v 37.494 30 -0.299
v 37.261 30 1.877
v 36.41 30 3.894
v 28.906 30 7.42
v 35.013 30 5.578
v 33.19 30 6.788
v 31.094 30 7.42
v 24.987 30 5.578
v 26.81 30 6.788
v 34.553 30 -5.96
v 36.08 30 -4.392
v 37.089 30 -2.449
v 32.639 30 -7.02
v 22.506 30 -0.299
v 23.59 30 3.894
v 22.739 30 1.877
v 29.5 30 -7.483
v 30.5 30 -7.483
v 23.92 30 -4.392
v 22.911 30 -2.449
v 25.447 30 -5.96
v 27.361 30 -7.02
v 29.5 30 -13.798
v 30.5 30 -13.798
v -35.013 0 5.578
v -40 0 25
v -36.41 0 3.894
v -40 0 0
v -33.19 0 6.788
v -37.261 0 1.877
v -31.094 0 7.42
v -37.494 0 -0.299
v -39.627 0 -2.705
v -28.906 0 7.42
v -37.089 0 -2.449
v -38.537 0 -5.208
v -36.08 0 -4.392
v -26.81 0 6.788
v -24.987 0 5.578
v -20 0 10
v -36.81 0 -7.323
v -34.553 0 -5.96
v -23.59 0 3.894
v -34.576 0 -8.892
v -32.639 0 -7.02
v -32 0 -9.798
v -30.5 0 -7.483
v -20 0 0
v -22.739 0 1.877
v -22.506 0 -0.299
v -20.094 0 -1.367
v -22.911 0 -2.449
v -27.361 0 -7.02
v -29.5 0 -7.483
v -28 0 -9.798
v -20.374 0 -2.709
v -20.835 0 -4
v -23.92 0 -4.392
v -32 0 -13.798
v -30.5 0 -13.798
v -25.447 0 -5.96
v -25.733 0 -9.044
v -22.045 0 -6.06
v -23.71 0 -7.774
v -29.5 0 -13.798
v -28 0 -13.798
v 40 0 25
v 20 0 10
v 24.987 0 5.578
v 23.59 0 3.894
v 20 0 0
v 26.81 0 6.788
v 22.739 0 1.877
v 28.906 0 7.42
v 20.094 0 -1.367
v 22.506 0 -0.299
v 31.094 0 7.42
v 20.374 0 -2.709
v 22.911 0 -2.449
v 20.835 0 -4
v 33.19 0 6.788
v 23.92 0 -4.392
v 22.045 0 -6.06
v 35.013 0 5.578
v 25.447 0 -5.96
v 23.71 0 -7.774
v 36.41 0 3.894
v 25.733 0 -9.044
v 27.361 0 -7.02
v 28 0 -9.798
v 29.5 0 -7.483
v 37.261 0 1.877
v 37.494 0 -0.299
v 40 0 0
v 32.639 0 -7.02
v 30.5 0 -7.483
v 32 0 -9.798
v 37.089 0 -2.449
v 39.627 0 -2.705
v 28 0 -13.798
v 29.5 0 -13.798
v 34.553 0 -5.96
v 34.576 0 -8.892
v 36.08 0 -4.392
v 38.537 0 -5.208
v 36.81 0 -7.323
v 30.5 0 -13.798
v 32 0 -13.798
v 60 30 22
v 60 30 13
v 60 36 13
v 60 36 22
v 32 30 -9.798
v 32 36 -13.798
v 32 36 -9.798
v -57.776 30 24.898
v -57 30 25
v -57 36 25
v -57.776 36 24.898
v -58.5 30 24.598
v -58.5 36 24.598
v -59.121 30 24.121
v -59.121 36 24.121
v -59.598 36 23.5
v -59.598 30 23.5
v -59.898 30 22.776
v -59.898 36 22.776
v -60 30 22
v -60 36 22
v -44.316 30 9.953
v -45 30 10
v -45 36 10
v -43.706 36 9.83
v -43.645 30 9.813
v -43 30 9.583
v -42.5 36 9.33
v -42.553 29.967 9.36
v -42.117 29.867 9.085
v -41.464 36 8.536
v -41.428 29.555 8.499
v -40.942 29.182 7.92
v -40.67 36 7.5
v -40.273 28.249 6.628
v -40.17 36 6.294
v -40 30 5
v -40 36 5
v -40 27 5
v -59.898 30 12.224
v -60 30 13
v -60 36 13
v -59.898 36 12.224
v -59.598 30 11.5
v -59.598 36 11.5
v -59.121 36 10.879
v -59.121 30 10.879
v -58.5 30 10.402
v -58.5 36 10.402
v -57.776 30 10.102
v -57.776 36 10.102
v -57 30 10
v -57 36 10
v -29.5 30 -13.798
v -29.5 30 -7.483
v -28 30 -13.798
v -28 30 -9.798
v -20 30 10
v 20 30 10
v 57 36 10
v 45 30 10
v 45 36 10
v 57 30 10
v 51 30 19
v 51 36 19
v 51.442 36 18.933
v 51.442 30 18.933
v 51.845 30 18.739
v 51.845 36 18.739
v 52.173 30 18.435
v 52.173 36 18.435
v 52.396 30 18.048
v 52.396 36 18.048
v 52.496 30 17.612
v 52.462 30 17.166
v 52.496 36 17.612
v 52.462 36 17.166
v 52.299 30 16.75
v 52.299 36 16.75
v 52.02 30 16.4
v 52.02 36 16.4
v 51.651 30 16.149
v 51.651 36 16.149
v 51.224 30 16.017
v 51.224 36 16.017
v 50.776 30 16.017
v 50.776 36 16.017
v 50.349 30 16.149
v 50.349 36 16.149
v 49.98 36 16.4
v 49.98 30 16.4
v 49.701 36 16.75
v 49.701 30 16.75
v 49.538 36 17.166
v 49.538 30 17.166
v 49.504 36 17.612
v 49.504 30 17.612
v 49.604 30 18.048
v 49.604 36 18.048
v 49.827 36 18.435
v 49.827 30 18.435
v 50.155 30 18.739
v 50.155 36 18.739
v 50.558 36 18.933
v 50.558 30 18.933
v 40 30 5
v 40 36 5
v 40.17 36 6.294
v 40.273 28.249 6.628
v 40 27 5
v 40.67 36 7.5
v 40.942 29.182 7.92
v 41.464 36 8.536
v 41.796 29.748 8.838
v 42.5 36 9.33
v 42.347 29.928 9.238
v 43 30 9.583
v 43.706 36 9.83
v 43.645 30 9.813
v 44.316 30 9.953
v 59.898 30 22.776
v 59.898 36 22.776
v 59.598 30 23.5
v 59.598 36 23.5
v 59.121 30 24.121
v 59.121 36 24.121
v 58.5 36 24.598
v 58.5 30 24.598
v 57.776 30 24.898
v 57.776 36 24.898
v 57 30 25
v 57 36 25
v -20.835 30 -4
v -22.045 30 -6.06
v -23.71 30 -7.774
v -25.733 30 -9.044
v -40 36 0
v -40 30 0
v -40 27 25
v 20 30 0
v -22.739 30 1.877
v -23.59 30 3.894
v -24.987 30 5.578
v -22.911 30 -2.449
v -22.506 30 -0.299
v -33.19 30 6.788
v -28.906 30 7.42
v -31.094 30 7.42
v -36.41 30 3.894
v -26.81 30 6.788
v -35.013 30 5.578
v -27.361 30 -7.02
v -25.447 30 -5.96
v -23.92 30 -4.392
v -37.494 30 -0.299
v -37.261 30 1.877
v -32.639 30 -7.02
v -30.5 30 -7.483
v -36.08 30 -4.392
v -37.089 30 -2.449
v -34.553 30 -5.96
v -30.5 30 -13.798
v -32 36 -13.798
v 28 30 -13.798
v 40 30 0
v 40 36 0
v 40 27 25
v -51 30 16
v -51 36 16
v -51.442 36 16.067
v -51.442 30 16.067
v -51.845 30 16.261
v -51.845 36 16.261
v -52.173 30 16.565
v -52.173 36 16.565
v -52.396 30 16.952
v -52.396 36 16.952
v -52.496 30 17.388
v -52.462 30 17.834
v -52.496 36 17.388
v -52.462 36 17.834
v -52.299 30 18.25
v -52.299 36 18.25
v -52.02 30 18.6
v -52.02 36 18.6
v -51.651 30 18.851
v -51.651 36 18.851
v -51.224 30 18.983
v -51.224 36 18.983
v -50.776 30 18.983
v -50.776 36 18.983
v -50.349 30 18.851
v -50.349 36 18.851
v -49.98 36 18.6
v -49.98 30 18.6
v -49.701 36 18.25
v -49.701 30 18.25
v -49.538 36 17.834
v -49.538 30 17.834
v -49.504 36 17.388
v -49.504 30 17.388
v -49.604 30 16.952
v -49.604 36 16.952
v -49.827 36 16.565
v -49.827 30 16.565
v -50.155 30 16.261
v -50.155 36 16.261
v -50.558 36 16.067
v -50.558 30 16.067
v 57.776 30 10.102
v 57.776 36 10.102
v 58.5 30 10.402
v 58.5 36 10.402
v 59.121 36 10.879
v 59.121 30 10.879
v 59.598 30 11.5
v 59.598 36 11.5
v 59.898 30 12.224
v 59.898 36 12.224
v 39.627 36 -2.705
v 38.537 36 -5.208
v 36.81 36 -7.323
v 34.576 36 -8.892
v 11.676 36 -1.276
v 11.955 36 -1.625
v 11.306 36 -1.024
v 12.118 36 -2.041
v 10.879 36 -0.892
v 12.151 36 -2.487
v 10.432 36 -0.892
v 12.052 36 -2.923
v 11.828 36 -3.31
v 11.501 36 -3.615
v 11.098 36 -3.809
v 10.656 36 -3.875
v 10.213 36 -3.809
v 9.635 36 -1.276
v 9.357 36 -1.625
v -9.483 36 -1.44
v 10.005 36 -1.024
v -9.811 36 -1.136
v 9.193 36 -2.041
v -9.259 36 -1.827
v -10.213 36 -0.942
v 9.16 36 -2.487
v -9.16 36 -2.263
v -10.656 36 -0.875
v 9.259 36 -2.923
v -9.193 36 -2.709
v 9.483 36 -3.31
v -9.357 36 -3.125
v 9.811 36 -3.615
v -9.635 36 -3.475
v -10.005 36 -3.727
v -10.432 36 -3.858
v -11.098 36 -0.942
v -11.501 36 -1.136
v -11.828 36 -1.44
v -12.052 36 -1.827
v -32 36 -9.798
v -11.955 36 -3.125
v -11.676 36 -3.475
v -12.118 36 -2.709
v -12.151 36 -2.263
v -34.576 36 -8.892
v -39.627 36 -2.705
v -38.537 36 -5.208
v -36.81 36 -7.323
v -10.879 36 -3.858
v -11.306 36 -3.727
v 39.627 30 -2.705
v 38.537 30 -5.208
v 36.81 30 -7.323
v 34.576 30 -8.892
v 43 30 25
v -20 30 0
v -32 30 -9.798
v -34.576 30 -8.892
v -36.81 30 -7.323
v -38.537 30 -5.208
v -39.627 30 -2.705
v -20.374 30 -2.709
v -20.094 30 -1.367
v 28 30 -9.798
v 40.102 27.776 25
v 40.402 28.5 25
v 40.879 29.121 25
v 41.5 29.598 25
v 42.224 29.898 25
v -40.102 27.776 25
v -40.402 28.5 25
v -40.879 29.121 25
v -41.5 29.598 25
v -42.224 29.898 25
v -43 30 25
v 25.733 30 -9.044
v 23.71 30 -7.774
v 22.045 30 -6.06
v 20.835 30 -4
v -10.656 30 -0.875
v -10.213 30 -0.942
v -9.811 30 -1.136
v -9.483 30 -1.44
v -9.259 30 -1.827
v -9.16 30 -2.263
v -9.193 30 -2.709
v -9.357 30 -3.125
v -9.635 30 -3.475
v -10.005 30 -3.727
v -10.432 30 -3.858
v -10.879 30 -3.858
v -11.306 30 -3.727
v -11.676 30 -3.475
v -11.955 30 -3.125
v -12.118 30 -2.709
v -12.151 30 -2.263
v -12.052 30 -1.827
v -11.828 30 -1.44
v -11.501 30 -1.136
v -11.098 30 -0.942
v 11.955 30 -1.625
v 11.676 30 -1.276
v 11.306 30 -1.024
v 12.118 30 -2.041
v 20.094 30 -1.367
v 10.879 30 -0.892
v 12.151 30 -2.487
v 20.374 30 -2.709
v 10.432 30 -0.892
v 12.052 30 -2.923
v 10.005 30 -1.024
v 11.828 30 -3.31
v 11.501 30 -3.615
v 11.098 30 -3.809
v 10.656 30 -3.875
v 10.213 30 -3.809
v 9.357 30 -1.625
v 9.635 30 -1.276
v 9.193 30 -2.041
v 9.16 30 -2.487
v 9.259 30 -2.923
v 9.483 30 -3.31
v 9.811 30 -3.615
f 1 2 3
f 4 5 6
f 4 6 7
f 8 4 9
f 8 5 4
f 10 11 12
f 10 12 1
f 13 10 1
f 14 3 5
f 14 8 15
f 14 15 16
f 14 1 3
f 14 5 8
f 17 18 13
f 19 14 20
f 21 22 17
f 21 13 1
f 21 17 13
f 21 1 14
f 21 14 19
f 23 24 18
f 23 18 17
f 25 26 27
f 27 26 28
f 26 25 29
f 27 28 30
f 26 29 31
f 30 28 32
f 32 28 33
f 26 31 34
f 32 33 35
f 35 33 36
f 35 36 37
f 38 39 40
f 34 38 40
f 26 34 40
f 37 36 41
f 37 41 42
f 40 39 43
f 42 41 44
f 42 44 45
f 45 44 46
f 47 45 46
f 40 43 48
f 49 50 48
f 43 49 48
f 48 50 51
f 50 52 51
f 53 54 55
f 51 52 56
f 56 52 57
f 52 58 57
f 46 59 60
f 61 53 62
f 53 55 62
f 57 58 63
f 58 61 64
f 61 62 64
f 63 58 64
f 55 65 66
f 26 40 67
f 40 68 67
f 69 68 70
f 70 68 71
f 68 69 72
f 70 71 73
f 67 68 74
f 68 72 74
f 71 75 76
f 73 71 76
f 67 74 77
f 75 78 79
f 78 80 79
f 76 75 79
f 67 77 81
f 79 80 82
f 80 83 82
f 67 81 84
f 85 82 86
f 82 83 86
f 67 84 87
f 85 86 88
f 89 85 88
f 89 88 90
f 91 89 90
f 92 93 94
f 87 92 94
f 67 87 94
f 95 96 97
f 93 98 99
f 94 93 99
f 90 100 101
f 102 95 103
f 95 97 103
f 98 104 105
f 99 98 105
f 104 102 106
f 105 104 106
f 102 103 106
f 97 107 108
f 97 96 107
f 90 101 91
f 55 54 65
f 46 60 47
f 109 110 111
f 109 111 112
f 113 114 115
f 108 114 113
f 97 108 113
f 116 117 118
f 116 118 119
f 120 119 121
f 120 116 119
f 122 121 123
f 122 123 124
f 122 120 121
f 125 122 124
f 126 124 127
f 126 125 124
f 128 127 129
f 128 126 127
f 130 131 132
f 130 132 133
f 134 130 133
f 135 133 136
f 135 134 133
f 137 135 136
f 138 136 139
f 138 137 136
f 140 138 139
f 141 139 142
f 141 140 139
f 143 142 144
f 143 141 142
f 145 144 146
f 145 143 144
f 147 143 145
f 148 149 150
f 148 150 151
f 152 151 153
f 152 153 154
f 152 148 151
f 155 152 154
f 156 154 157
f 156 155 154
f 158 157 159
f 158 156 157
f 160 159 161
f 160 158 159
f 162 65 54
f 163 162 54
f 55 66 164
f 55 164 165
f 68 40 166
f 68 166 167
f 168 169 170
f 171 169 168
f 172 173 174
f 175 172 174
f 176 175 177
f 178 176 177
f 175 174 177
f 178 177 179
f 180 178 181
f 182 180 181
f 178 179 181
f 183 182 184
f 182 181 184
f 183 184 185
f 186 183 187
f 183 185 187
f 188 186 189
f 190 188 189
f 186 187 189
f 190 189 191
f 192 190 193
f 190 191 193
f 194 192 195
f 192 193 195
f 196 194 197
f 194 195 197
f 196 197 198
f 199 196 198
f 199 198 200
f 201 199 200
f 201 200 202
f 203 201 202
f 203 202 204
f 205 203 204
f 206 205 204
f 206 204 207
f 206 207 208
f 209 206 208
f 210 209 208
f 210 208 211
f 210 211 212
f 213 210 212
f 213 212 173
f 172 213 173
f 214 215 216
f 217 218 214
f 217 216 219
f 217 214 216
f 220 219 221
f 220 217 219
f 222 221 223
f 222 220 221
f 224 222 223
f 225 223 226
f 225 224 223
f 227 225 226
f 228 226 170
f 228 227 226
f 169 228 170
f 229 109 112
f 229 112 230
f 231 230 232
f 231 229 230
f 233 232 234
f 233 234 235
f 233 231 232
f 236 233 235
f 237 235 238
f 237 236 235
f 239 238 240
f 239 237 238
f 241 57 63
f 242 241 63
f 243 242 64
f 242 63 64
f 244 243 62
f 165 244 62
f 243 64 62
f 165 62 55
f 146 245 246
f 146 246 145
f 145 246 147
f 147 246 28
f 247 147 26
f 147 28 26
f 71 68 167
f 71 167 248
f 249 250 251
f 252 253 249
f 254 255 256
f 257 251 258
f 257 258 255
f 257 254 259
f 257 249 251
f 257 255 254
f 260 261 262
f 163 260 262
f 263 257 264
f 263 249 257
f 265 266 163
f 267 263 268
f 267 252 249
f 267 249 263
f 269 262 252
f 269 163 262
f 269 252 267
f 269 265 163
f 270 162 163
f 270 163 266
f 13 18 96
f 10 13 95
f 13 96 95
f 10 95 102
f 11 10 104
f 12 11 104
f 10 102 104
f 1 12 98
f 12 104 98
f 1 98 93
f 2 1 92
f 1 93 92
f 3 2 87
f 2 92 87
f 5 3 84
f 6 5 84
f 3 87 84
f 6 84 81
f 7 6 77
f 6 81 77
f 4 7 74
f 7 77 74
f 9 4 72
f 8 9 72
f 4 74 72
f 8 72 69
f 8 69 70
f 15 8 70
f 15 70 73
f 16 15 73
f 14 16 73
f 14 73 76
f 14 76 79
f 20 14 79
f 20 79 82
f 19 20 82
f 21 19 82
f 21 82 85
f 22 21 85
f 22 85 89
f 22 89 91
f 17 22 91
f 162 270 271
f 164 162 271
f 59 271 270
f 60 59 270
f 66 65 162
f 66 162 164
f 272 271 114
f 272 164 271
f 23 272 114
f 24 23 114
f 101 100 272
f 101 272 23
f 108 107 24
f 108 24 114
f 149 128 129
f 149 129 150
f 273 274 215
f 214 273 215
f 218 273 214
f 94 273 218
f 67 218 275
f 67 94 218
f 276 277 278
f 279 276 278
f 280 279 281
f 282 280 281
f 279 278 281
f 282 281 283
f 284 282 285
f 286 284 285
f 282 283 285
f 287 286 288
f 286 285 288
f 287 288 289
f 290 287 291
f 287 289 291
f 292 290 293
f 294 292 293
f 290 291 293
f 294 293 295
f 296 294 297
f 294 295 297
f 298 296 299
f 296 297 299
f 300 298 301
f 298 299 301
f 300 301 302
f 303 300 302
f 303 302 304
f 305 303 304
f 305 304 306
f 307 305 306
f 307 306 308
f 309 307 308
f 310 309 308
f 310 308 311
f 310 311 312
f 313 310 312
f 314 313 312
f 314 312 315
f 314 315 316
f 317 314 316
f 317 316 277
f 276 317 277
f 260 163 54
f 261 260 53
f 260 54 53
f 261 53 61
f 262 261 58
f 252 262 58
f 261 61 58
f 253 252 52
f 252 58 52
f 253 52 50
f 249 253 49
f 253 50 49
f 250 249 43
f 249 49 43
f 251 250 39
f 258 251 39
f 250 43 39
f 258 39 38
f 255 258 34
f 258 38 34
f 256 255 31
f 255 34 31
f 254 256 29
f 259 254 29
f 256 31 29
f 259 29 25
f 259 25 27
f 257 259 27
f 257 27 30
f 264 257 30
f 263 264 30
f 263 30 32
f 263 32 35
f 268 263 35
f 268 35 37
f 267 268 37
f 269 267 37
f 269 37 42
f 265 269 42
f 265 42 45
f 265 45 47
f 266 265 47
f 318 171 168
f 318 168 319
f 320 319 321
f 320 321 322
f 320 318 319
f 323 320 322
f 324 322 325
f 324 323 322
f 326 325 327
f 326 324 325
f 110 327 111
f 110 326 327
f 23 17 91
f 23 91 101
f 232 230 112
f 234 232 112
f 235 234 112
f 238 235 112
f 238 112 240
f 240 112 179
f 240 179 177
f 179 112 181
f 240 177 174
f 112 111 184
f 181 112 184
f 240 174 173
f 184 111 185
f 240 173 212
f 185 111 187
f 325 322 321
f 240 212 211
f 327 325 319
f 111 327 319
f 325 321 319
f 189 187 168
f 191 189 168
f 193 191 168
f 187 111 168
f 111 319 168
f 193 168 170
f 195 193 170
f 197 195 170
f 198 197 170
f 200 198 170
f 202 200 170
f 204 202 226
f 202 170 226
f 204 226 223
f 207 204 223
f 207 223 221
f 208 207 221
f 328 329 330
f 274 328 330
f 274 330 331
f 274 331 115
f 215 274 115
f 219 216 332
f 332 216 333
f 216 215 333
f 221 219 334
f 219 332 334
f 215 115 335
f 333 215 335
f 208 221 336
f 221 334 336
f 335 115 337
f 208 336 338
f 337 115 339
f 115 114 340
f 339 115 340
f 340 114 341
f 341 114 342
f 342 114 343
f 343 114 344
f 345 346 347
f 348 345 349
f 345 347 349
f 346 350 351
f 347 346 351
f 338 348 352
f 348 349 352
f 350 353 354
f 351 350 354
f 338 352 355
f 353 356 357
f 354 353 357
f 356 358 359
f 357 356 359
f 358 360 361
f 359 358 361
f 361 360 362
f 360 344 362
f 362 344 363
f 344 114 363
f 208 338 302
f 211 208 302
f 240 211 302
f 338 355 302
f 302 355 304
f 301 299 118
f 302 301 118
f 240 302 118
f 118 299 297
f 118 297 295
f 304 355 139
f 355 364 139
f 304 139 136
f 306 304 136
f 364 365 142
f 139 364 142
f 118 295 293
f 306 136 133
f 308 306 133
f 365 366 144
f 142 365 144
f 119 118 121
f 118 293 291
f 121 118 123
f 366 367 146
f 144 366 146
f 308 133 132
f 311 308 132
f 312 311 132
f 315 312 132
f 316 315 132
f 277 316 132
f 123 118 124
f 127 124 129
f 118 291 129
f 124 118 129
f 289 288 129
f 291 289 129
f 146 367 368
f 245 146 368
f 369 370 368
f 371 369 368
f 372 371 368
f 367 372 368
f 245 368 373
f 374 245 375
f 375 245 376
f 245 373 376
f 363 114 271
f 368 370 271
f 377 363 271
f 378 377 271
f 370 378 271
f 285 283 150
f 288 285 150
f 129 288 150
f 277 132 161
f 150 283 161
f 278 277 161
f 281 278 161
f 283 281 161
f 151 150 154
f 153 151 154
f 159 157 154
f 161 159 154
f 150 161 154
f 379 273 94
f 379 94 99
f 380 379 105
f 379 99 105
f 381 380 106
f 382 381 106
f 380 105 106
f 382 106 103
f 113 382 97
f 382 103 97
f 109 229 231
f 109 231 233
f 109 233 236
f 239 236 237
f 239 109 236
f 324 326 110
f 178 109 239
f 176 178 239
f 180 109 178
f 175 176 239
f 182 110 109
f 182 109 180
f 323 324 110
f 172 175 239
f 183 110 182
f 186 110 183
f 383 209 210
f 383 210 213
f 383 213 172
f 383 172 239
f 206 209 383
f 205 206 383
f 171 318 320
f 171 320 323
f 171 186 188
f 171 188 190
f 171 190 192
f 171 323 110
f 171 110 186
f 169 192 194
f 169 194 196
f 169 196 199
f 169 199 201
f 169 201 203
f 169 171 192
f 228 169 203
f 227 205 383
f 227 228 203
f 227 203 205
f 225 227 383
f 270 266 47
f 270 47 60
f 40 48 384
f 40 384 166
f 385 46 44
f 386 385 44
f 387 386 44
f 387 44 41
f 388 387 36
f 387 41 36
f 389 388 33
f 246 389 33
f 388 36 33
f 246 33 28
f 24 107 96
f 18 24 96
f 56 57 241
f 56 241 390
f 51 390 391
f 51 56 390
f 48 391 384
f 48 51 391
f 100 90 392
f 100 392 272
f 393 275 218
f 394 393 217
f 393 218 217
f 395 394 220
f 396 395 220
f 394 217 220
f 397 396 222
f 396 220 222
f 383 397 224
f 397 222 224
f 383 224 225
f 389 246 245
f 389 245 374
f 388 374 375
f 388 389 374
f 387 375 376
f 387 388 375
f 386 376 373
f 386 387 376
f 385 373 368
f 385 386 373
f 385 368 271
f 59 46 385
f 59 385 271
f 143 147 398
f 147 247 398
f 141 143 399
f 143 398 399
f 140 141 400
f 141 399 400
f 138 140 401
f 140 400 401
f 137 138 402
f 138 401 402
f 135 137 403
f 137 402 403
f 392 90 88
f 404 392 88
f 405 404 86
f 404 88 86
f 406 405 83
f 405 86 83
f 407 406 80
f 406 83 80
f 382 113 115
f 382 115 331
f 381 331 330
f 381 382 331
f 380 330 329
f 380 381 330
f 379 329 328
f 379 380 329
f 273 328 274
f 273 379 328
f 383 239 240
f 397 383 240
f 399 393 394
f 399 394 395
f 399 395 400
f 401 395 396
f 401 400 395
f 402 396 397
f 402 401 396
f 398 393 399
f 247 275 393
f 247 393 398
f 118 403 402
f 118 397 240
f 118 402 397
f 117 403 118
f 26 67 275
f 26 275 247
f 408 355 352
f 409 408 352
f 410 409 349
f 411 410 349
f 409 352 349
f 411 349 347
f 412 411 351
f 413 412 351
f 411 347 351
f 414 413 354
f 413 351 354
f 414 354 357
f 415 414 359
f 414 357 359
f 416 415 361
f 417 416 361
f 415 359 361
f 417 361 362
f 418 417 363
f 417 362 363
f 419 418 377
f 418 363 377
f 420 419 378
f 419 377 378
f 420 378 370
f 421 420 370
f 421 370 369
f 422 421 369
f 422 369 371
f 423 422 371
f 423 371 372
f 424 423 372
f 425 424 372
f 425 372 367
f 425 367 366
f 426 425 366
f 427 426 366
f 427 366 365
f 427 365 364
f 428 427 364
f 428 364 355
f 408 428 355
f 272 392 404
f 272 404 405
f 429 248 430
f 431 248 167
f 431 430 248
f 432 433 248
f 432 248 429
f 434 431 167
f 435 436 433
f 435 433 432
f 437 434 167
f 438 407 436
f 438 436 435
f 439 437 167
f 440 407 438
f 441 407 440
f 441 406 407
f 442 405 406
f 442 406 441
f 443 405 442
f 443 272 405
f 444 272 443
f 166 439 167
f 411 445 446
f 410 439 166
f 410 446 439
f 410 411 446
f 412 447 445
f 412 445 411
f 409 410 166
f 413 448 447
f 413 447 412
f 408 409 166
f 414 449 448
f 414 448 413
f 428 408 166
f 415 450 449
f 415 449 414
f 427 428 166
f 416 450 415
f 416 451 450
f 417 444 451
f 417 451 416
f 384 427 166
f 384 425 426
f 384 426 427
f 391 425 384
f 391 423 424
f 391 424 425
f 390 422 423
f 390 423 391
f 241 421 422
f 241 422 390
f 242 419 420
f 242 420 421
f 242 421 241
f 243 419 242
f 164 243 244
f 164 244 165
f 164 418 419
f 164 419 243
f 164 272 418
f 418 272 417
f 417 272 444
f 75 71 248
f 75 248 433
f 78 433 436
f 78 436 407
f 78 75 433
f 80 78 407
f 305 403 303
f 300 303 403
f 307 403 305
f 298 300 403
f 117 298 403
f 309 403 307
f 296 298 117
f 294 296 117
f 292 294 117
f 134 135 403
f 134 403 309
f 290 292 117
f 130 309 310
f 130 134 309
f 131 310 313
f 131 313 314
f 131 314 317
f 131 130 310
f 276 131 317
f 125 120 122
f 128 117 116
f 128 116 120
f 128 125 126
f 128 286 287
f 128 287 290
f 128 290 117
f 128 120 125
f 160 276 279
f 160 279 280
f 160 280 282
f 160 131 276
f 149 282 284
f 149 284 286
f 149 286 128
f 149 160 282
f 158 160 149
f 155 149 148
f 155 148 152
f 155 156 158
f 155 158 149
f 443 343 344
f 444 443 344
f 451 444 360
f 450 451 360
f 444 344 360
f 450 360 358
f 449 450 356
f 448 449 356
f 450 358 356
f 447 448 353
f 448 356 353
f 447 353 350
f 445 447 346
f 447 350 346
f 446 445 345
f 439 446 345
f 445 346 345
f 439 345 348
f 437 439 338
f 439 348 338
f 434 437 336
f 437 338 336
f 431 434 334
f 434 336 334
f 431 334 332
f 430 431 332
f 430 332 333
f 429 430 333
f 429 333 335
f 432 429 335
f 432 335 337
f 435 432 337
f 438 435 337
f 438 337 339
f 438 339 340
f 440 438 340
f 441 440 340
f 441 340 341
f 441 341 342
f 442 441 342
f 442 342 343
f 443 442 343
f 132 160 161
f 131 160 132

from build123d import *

# Parameters (mm, degrees)
SALIENTE_EXTRUIR1_DEPTH    = 30
SALIENTE_EXTRUIR2_START    = -30
SALIENTE_EXTRUIR2_DEPTH    = 30
CORTAR_EXTRUIR2_DEPTH      = 56.901699437
CORTAR_EXTRUIR2_DEPTH_BACK = 56.901699437
CORTAR_EXTRUIR3_START      = -30
CORTAR_EXTRUIR3_DEPTH      = 30
SALIENTE_EXTRUIR3_DEPTH    = 6
CROQUIS13_R                = 1.5
CORTAR_EXTRUIR6_DEPTH      = 75.303431953
REDONDEO3_R                = 3
REDONDEO4_R                = 3


with BuildPart() as part:
    # Croquis1 → Saliente-Extruir1 (new body)
    with BuildSketch(Plane(origin=(0, 0, 0), x_dir=(1, 0, 0), z_dir=(0, 1, 0))):
        with BuildLine():
            Line((40, -25), (40, 0))
            ThreePointArc((40, 0), (32.043096437, 9.789063129), (20.83484861, 4))
            Line((20.83484861, 4), (11.313708499, 4))
            ThreePointArc((11.313708499, 4), (0, 12), (-11.313708499, 4))
            Line((-11.313708499, 4), (-20.83484861, 4))
            ThreePointArc((-20.83484861, 4), (-32.043096437, 9.789063129), (-40, 0))
            Line((-40, 0), (-40, -25))
            Line((-40, -25), (40, -25))
        make_face()
    extrude(amount=SALIENTE_EXTRUIR1_DEPTH)

    # Croquis3 → Saliente-Extruir2 (add)
    with BuildSketch(Plane(origin=(0, 30, 0), x_dir=(1, 0, 0), z_dir=(0, 1, 0)).offset(SALIENTE_EXTRUIR2_START)):
        with BuildLine():
            Line((-32, 9.797958971), (-32, 13.797958971))
            Line((-32, 13.797958971), (-28, 13.797958971))
            Line((-28, 13.797958971), (-28, 9.797958971))
            ThreePointArc((-28, 9.797958971), (-30, 10), (-32, 9.797958971))
        make_face()
        with BuildLine():
            Line((28, 9.797958971), (28, 13.797958971))
            Line((28, 13.797958971), (32, 13.797958971))
            Line((32, 13.797958971), (32, 9.797958971))
            ThreePointArc((32, 9.797958971), (30, 10), (28, 9.797958971))
        make_face()
    extrude(amount=SALIENTE_EXTRUIR2_DEPTH)

    # Croquis4 → Cortar-Extruir2 (cut, two sides: drawn at the far end of the back side and taken through both)
    with BuildSketch(Plane(origin=(0, 30, 0), x_dir=(1, 0, 0), z_dir=(0, 1, 0)).offset(-CORTAR_EXTRUIR2_DEPTH_BACK)):
        with BuildLine():
            Line((-30.5, 7.483314774), (-30.5, 14.654769407))
            Line((-30.5, 14.654769407), (-29.5, 14.654769407))
            Line((-29.5, 14.654769407), (-29.5, 7.483314774))
            ThreePointArc((-29.5, 7.483314774), (-30, -7.5), (-30.5, 7.483314774))
        make_face()
        with BuildLine():
            Line((29.5, 7.483314774), (29.5, 14.654769407))
            Line((29.5, 14.654769407), (30.5, 14.654769407))
            Line((30.5, 14.654769407), (30.5, 7.483314774))
            ThreePointArc((30.5, 7.483314774), (30, -7.5), (29.5, 7.483314774))
        make_face()
    extrude(amount=CORTAR_EXTRUIR2_DEPTH + CORTAR_EXTRUIR2_DEPTH_BACK, mode=Mode.SUBTRACT)

    # Croquis5 → Cortar-Extruir3 (cut)
    with BuildSketch(Plane(origin=(0, 30, 0), x_dir=(1, 0, 0), z_dir=(0, 1, 0)).offset(CORTAR_EXTRUIR3_START)):
        with BuildLine():
            Line((-20, 0), (-20, -10))
            Line((-20, -10), (20, -10))
            Line((20, -10), (20, 0))
            ThreePointArc((20, 0), (20.210936871, 2.043096437), (20.83484861, 4))
            Line((20.83484861, 4), (20.83484861, 13.99599321))
            Line((20.83484861, 13.99599321), (-20.83484861, 13.99599321))
            Line((-20.83484861, 13.99599321), (-20.83484861, 4))
            ThreePointArc((-20.83484861, 4), (-20.210936871, 2.043096437), (-20, 0))
        make_face()
    extrude(amount=CORTAR_EXTRUIR3_DEPTH, mode=Mode.SUBTRACT)

    # Croquis12 → Saliente-Extruir3 (add)
    with BuildSketch(Plane(origin=(0, 30, 0), x_dir=(1, 0, 0), z_dir=(0, 1, 0))):
        with BuildLine():
            Line((40, -25), (-40, -25))
            Line((-40, -25), (-57, -25))
            ThreePointArc((-57, -25), (-59.121320344, -24.121320344), (-60, -22))
            Line((-60, -22), (-60, -13))
            ThreePointArc((-60, -13), (-59.121320344, -10.878679656), (-57, -10))
            Line((-57, -10), (-45, -10))
            ThreePointArc((-45, -10), (-41.464466094, -8.535533906), (-40, -5))
            Line((-40, -5), (-40, 0))
            ThreePointArc((-40, 0), (-37.745966692, 6.32455532), (-32, 9.797958971))
            Line((-32, 9.797958971), (-32, 13.797958971))
            Line((-32, 13.797958971), (32, 13.797958971))
            Line((32, 13.797958971), (32, 9.797958971))
            ThreePointArc((32, 9.797958971), (37.745966692, 6.32455532), (40, 0))
            Line((40, 0), (40, -5))
            ThreePointArc((40, -5), (41.464466094, -8.535533906), (45, -10))
            Line((45, -10), (57, -10))
            ThreePointArc((57, -10), (59.121320344, -10.878679656), (60, -13))
            Line((60, -13), (60, -22))
            ThreePointArc((60, -22), (59.121320344, -24.121320344), (57, -25))
            Line((57, -25), (40, -25))
        make_face()
    extrude(amount=SALIENTE_EXTRUIR3_DEPTH)

    # Croquis13 → Cortar-Extruir6 (cut, through all)
    with BuildSketch(Plane(origin=(0, 36, 0), x_dir=(1, 0, 0), z_dir=(0, 1, 0))):
        with Locations(Location((51, -17.5, 0), (0, 0, 270))):
            Circle(CROQUIS13_R)
        with Locations(Location((-51, -17.5, 0), (0, 0, 90))):
            Circle(CROQUIS13_R)
        with Locations(Location((-10.655547213, 2.375143361, 0), (0, 0, 270))):
            Circle(CROQUIS13_R)
        with Locations(Location((10.655547213, 2.375143361, 0), (0, 0, 90))):
            Circle(CROQUIS13_R)
    extrude(amount=-CORTAR_EXTRUIR6_DEPTH, mode=Mode.SUBTRACT)

    # Redondeo3
    redondeo3_edges = [part.edges().sort_by_distance(p)[0] for p in [
        (40, 30, 15),
    ]]
    fillet(redondeo3_edges, radius=REDONDEO3_R)

    # Redondeo4
    redondeo4_edges = [part.edges().sort_by_distance(p)[0] for p in [
        (-40, 30, 15),
    ]]
    fillet(redondeo4_edges, radius=REDONDEO4_R)


solid = part.part
